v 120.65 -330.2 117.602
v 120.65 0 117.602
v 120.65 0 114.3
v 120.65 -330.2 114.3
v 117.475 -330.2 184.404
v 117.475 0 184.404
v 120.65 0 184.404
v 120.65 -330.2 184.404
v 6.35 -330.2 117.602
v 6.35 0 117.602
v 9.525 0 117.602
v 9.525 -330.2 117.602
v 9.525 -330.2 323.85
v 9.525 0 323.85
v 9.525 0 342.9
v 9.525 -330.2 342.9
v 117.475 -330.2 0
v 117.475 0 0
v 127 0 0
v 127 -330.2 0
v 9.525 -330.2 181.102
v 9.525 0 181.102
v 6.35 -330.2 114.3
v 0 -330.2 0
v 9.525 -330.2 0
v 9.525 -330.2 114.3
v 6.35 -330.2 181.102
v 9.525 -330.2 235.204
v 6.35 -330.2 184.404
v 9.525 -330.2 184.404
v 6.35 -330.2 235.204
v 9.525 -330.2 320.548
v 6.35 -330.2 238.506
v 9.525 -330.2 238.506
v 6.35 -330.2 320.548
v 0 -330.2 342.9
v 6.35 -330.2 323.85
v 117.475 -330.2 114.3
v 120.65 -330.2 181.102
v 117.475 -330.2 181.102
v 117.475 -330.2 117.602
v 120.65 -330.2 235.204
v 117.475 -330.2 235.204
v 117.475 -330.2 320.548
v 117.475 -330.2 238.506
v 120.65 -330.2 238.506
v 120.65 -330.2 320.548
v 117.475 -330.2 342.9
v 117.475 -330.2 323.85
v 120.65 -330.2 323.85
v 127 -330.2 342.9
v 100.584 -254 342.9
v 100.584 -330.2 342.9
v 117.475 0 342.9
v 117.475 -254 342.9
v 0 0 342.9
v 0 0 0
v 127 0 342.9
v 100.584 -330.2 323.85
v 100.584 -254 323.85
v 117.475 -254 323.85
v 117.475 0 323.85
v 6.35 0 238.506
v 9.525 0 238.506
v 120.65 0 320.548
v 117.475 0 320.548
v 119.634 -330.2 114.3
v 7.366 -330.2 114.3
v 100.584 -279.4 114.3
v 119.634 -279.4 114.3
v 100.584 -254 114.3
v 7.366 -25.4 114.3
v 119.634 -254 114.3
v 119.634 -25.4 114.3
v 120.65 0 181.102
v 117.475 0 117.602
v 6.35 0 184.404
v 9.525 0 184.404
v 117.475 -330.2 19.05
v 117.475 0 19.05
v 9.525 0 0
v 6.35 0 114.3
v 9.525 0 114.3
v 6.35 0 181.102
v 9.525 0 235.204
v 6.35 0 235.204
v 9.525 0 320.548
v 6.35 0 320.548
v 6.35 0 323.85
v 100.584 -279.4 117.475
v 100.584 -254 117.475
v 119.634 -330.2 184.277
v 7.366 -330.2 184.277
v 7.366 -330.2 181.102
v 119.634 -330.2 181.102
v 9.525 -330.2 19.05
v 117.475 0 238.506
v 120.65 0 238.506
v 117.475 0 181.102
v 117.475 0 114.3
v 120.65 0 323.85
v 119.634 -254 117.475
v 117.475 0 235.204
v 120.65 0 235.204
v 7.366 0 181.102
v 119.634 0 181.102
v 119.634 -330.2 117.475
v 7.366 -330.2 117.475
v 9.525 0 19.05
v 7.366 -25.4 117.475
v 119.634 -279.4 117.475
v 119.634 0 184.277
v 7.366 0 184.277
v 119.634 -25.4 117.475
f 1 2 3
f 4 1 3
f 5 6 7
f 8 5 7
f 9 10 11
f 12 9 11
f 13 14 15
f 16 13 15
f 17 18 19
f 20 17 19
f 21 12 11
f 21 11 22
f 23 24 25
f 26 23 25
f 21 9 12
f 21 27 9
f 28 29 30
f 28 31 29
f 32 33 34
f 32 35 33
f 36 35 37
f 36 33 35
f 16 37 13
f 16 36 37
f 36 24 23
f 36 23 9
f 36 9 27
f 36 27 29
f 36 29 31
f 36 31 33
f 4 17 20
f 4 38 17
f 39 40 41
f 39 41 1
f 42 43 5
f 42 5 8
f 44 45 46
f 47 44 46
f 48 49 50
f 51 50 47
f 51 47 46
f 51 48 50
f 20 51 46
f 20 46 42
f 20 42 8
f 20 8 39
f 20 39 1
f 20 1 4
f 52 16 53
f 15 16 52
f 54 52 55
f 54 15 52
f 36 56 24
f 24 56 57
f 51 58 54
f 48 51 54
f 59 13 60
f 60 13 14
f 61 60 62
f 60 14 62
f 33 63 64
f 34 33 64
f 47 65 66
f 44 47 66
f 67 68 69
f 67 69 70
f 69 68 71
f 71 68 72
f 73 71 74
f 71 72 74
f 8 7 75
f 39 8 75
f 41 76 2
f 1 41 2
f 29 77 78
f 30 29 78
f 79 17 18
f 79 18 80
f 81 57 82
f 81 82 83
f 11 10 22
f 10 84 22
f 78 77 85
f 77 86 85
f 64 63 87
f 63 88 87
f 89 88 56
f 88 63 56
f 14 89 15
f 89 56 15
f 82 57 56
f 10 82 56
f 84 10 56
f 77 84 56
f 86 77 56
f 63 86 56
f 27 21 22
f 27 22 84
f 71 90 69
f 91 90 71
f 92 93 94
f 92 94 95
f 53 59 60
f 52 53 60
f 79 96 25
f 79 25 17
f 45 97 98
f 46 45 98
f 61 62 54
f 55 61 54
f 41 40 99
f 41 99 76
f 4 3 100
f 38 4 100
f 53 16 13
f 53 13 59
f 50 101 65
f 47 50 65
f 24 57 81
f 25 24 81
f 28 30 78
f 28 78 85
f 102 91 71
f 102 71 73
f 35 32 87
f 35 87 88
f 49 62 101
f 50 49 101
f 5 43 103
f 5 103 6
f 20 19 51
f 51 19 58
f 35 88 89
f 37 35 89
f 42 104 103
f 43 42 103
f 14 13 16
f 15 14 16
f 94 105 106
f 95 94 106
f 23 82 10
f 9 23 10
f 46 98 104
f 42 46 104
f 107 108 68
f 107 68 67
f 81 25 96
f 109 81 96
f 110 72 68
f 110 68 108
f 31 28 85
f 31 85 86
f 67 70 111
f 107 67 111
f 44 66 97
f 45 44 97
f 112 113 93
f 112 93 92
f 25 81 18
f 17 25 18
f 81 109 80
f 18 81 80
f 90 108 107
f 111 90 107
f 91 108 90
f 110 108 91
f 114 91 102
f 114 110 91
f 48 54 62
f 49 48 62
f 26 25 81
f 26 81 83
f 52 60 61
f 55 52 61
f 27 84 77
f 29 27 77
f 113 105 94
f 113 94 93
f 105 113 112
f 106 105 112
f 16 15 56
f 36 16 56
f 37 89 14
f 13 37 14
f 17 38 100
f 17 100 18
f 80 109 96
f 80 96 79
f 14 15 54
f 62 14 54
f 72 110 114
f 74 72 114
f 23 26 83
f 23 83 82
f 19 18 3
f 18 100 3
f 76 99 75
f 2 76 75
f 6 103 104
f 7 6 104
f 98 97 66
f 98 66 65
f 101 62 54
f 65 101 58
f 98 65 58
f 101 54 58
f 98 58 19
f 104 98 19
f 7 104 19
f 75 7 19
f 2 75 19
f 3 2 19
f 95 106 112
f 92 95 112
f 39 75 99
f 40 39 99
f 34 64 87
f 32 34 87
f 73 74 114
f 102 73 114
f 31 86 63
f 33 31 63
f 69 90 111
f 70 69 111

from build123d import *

# Parameters (mm, degrees)
F1_DEPTH  = 330.2
F0_W      = 107.95
F0_H      = 19.05
F2_DEPTH  = 330.2
F3_W      = 112.268
F3_H      = 3.175
F4_DEPTH  = 330.2
F5_W      = 19.05
F5_H      = 25.4
F6_DEPTH  = 3.175
F7_DEPTH  = 225.426
F8_W      = 16.891
F8_H      = 50.8000000001
F9_DEPTH  = 342.901
F10_W     = 112.268
F10_H     = 25.4
F11_DEPTH = 117.476


with BuildPart() as f1:
    # F0 (on Front) → F1 (new body)
    with BuildSketch(Plane.XZ):
        Polygon((0, 342.9), (0, 0), (9.525, 0), (9.525, 19.05), (9.525, 114.3), (6.35, 114.3), (6.35, 117.602), (9.525, 117.602), (9.525, 181.102), (6.35, 181.102), (6.35, 184.404), (9.525, 184.404), (9.525, 235.204), (6.35, 235.204), (6.35, 238.506), (9.525, 238.506), (9.525, 320.548), (6.35, 320.548), (6.35, 323.85), (9.525, 323.85), (9.525, 342.9), align=None)
    extrude(amount=F1_DEPTH)


with BuildPart() as f1b:
    # F0 (on Front) → F1, piece 2 (new body)
    with BuildSketch(Plane.XZ):
        Polygon((117.475, 19.05), (117.475, 0), (127, 0), (127, 342.9), (117.475, 342.9), (117.475, 323.85), (120.65, 323.85), (120.65, 320.548), (117.475, 320.548), (117.475, 238.506), (120.65, 238.506), (120.65, 235.204), (117.475, 235.204), (117.475, 184.404), (120.65, 184.404), (120.65, 181.102), (117.475, 181.102), (117.475, 117.602), (120.65, 117.602), (120.65, 114.3), (117.475, 114.3), align=None)
    extrude(amount=F1_DEPTH)


with BuildPart() as f2:
    # F0 (on Front) → F2 (new body, through all)
    with BuildSketch(Plane.XZ):
        with Locations((63.5, 9.525)):
            Rectangle(F0_W, F0_H)
    extrude(amount=F2_DEPTH)


with BuildPart() as f2b:
    # F0 (on Front) → F2, piece 2 (new body, through all)
    with BuildSketch(Plane.XZ):
        with Locations((63.5, 333.375)):
            Rectangle(F0_W, F0_H)
    extrude(amount=F2_DEPTH)

    # F5 (on face) → F7 (cut, through all)
    with BuildSketch(Plane.XY.offset(117.475)):
        with Locations((110.109, -266.7)):
            Rectangle(F5_W, F5_H)
    extrude(amount=F7_DEPTH, mode=Mode.SUBTRACT)

    # F8 (on face) → F9 (cut, through all)
    with BuildSketch(Plane.XY.offset(342.9)):
        with Locations((109.0295, -304.8000000001)):
            Rectangle(F8_W, F8_H)
    extrude(amount=-F9_DEPTH, mode=Mode.SUBTRACT)


with BuildPart() as f4:
    # F3 (on Front) → F4 (new body, through all)
    with BuildSketch(Plane.XZ):
        with Locations((63.5, 115.8875)):
            Rectangle(F3_W, F3_H)
    extrude(amount=F4_DEPTH)

    # F5 (on face) → F6 (cut, through all)
    with BuildSketch(Plane.XY.offset(117.475)):
        with Locations((110.109, -266.7)):
            Rectangle(F5_W, F5_H)
    extrude(amount=-F6_DEPTH, mode=Mode.SUBTRACT)

    # F10 (on face) → F11 (cut, through all)
    with BuildSketch(Plane.XY.offset(117.475)):
        with Locations((63.5, -12.7)):
            Rectangle(F10_W, F10_H)
    extrude(amount=-F11_DEPTH, mode=Mode.SUBTRACT)


with BuildPart() as f4b:
    # F3 (on Front) → F4, piece 2 (new body, through all)
    with BuildSketch(Plane.XZ):
        with Locations((63.5, 182.6895)):
            Rectangle(F3_W, F3_H)
    extrude(amount=F4_DEPTH)


solid = Compound([f1.part, f1b.part, f2.part, f2b.part, f4.part, f4b.part])
